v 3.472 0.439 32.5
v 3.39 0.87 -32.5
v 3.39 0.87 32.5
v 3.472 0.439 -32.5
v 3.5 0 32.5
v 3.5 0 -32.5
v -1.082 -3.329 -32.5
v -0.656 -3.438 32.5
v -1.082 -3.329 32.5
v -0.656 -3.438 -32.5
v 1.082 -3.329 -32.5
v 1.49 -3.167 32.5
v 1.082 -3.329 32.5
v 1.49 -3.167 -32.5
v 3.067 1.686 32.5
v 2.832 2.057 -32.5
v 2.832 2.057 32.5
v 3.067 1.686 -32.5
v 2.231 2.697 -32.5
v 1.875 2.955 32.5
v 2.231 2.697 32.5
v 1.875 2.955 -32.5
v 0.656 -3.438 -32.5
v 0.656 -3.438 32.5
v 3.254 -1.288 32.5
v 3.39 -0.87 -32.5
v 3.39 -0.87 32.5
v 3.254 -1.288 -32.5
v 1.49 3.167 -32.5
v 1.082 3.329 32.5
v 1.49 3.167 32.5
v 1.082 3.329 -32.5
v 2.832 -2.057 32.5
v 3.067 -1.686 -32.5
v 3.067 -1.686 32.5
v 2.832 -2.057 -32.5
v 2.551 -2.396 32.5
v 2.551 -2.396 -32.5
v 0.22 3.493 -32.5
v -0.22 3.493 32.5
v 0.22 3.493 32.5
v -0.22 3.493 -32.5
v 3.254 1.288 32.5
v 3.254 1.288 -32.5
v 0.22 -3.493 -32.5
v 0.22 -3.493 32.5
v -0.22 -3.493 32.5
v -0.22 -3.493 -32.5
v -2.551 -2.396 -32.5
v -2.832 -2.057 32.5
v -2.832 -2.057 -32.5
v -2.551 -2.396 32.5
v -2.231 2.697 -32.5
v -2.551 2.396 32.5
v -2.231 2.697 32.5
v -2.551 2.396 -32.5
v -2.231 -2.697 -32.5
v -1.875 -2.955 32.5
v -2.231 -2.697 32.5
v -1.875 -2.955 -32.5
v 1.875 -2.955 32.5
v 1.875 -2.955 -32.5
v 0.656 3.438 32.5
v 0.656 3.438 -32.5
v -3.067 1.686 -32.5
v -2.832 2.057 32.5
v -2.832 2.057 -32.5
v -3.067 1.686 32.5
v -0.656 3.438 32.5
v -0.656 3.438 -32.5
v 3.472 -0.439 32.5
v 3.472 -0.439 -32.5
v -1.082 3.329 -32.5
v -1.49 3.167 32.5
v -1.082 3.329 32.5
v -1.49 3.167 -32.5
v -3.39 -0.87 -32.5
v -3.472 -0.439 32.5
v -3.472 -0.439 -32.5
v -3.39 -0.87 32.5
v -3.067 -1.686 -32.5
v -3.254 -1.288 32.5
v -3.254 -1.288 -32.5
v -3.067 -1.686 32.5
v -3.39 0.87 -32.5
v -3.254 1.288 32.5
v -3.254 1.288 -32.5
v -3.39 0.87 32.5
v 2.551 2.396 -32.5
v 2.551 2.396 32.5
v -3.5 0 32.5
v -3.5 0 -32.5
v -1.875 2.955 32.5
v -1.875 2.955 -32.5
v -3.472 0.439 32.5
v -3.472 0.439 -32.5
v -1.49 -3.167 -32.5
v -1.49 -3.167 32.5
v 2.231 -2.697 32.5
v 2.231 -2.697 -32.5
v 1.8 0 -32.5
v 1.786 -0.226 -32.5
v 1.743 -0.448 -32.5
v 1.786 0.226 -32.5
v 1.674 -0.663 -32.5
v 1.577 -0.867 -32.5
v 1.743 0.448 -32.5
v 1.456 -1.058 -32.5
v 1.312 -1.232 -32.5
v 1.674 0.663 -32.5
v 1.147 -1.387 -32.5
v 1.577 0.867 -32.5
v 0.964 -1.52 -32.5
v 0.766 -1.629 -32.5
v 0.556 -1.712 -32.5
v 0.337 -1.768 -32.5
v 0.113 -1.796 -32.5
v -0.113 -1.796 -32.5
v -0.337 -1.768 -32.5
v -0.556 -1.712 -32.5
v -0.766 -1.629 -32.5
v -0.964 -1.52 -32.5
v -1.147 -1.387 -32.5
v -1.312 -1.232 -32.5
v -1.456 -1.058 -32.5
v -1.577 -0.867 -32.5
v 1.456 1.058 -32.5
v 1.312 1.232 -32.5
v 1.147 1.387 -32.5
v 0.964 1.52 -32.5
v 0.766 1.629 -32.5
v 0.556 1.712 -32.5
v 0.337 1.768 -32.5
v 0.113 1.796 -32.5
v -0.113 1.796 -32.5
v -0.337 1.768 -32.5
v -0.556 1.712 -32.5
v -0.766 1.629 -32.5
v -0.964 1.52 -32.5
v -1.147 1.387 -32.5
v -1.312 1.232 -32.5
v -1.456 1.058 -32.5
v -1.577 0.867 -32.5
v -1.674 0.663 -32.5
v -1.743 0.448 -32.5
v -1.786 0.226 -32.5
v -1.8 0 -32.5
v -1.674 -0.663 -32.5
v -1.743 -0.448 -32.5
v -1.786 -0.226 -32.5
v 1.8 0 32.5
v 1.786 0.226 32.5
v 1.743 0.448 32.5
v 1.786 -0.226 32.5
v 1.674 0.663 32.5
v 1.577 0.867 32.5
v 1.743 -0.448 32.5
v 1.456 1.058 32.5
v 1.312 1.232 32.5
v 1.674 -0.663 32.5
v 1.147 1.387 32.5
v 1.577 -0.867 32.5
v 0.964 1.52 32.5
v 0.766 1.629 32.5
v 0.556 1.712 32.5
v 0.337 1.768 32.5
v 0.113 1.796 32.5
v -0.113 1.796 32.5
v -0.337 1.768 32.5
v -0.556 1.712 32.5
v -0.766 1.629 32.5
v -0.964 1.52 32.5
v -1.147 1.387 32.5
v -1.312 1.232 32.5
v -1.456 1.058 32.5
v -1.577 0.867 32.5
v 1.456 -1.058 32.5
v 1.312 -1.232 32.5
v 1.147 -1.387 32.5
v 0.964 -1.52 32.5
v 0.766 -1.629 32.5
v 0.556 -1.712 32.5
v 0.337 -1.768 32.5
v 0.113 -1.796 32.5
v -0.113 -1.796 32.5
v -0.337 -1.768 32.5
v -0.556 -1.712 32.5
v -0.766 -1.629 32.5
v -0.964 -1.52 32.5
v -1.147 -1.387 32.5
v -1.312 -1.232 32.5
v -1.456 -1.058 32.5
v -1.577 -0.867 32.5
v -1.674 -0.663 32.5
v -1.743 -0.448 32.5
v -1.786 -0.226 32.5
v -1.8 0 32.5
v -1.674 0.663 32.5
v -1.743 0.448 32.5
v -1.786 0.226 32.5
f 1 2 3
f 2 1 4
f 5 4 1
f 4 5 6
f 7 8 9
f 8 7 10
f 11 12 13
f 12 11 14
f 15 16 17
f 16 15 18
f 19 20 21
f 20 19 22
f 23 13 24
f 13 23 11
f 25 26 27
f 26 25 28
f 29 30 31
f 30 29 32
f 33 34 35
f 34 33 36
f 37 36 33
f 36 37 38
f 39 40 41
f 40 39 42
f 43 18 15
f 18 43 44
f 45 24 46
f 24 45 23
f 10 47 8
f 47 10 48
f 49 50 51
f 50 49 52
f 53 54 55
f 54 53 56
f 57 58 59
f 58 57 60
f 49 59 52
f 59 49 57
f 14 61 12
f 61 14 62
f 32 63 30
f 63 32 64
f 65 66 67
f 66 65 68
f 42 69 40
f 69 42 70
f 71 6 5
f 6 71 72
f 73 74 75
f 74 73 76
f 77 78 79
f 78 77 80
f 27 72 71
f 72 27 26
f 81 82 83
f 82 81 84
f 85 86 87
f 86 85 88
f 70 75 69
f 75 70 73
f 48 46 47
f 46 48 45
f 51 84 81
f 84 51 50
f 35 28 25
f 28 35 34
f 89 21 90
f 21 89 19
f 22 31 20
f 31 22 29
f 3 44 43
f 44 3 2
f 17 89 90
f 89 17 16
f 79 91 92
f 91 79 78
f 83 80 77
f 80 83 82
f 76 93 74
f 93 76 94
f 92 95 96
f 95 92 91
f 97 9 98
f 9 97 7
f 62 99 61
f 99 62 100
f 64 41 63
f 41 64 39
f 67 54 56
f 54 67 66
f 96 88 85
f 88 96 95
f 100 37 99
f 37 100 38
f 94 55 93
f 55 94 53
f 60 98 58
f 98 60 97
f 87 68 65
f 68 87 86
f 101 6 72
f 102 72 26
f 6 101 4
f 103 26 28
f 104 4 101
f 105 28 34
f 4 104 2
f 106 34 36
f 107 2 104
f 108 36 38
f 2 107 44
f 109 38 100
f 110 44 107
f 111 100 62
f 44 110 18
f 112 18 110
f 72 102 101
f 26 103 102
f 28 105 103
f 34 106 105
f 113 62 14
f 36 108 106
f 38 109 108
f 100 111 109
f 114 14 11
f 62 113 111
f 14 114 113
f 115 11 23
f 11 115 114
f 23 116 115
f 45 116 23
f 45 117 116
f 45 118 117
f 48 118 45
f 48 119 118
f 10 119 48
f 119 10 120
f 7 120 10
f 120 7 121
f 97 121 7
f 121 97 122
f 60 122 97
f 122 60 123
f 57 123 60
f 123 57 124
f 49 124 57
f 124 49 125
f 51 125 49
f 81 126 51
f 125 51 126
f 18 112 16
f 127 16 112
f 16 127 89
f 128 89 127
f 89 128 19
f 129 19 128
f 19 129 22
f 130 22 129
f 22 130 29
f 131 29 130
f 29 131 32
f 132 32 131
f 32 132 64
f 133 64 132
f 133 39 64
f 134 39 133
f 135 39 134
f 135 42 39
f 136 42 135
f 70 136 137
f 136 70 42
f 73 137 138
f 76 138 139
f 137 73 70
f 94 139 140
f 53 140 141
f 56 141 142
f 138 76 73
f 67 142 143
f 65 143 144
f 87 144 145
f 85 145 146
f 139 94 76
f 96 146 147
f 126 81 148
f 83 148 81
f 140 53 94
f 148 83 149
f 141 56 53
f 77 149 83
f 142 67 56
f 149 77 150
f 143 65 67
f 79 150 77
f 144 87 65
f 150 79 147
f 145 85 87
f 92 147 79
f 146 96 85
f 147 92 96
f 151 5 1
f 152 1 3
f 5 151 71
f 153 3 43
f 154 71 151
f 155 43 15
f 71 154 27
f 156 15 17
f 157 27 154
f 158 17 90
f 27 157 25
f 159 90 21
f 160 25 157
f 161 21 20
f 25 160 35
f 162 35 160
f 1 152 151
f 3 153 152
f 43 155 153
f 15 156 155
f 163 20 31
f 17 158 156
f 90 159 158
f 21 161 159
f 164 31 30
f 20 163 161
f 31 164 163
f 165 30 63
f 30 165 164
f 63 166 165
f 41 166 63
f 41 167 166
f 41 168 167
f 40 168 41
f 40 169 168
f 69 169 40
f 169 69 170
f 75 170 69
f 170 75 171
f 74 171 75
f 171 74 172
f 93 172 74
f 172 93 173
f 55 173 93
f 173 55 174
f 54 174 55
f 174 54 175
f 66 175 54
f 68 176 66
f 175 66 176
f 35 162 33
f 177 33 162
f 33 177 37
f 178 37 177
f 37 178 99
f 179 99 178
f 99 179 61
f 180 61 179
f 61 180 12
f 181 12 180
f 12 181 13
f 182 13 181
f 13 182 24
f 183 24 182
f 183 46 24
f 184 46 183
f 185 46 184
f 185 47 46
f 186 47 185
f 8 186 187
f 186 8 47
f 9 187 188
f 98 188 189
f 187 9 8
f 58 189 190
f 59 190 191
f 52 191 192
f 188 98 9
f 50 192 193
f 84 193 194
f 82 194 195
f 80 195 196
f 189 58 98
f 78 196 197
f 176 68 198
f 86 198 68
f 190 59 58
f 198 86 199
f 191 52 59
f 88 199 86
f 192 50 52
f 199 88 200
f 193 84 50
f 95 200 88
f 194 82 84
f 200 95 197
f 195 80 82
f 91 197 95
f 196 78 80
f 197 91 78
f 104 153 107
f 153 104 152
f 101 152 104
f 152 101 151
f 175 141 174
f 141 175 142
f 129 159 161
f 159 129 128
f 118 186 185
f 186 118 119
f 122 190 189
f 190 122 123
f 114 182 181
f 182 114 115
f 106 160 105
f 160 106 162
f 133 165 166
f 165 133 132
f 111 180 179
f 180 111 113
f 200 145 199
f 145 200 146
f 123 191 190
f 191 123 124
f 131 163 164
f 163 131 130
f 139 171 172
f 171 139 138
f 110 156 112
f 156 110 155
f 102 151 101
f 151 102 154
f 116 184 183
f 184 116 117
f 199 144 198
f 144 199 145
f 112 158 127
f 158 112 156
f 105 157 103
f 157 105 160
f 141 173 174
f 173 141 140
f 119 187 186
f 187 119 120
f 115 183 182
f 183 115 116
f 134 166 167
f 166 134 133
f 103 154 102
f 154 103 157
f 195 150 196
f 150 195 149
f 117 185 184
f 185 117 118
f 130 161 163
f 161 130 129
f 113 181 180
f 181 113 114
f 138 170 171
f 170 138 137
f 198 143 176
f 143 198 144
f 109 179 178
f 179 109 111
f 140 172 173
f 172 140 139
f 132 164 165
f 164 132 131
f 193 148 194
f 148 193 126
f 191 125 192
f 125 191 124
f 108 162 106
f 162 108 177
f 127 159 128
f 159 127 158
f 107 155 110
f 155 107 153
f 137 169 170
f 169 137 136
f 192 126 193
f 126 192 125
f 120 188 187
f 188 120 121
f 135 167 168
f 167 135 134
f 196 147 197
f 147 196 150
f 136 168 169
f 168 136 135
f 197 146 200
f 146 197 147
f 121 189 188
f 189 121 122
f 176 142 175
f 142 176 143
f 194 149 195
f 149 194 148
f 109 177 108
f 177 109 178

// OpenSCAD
$fn = 50;


difference() {
	union() {
		translate(v = [0, 0, -32.5000000000]) {
			cylinder(h = 65, r = 3.5000000000);
		}
	}
	union() {
		#translate(v = [0, 0, -100.0000000000]) {
			cylinder(h = 200, r = 1.8000000000);
		}
	}
}
